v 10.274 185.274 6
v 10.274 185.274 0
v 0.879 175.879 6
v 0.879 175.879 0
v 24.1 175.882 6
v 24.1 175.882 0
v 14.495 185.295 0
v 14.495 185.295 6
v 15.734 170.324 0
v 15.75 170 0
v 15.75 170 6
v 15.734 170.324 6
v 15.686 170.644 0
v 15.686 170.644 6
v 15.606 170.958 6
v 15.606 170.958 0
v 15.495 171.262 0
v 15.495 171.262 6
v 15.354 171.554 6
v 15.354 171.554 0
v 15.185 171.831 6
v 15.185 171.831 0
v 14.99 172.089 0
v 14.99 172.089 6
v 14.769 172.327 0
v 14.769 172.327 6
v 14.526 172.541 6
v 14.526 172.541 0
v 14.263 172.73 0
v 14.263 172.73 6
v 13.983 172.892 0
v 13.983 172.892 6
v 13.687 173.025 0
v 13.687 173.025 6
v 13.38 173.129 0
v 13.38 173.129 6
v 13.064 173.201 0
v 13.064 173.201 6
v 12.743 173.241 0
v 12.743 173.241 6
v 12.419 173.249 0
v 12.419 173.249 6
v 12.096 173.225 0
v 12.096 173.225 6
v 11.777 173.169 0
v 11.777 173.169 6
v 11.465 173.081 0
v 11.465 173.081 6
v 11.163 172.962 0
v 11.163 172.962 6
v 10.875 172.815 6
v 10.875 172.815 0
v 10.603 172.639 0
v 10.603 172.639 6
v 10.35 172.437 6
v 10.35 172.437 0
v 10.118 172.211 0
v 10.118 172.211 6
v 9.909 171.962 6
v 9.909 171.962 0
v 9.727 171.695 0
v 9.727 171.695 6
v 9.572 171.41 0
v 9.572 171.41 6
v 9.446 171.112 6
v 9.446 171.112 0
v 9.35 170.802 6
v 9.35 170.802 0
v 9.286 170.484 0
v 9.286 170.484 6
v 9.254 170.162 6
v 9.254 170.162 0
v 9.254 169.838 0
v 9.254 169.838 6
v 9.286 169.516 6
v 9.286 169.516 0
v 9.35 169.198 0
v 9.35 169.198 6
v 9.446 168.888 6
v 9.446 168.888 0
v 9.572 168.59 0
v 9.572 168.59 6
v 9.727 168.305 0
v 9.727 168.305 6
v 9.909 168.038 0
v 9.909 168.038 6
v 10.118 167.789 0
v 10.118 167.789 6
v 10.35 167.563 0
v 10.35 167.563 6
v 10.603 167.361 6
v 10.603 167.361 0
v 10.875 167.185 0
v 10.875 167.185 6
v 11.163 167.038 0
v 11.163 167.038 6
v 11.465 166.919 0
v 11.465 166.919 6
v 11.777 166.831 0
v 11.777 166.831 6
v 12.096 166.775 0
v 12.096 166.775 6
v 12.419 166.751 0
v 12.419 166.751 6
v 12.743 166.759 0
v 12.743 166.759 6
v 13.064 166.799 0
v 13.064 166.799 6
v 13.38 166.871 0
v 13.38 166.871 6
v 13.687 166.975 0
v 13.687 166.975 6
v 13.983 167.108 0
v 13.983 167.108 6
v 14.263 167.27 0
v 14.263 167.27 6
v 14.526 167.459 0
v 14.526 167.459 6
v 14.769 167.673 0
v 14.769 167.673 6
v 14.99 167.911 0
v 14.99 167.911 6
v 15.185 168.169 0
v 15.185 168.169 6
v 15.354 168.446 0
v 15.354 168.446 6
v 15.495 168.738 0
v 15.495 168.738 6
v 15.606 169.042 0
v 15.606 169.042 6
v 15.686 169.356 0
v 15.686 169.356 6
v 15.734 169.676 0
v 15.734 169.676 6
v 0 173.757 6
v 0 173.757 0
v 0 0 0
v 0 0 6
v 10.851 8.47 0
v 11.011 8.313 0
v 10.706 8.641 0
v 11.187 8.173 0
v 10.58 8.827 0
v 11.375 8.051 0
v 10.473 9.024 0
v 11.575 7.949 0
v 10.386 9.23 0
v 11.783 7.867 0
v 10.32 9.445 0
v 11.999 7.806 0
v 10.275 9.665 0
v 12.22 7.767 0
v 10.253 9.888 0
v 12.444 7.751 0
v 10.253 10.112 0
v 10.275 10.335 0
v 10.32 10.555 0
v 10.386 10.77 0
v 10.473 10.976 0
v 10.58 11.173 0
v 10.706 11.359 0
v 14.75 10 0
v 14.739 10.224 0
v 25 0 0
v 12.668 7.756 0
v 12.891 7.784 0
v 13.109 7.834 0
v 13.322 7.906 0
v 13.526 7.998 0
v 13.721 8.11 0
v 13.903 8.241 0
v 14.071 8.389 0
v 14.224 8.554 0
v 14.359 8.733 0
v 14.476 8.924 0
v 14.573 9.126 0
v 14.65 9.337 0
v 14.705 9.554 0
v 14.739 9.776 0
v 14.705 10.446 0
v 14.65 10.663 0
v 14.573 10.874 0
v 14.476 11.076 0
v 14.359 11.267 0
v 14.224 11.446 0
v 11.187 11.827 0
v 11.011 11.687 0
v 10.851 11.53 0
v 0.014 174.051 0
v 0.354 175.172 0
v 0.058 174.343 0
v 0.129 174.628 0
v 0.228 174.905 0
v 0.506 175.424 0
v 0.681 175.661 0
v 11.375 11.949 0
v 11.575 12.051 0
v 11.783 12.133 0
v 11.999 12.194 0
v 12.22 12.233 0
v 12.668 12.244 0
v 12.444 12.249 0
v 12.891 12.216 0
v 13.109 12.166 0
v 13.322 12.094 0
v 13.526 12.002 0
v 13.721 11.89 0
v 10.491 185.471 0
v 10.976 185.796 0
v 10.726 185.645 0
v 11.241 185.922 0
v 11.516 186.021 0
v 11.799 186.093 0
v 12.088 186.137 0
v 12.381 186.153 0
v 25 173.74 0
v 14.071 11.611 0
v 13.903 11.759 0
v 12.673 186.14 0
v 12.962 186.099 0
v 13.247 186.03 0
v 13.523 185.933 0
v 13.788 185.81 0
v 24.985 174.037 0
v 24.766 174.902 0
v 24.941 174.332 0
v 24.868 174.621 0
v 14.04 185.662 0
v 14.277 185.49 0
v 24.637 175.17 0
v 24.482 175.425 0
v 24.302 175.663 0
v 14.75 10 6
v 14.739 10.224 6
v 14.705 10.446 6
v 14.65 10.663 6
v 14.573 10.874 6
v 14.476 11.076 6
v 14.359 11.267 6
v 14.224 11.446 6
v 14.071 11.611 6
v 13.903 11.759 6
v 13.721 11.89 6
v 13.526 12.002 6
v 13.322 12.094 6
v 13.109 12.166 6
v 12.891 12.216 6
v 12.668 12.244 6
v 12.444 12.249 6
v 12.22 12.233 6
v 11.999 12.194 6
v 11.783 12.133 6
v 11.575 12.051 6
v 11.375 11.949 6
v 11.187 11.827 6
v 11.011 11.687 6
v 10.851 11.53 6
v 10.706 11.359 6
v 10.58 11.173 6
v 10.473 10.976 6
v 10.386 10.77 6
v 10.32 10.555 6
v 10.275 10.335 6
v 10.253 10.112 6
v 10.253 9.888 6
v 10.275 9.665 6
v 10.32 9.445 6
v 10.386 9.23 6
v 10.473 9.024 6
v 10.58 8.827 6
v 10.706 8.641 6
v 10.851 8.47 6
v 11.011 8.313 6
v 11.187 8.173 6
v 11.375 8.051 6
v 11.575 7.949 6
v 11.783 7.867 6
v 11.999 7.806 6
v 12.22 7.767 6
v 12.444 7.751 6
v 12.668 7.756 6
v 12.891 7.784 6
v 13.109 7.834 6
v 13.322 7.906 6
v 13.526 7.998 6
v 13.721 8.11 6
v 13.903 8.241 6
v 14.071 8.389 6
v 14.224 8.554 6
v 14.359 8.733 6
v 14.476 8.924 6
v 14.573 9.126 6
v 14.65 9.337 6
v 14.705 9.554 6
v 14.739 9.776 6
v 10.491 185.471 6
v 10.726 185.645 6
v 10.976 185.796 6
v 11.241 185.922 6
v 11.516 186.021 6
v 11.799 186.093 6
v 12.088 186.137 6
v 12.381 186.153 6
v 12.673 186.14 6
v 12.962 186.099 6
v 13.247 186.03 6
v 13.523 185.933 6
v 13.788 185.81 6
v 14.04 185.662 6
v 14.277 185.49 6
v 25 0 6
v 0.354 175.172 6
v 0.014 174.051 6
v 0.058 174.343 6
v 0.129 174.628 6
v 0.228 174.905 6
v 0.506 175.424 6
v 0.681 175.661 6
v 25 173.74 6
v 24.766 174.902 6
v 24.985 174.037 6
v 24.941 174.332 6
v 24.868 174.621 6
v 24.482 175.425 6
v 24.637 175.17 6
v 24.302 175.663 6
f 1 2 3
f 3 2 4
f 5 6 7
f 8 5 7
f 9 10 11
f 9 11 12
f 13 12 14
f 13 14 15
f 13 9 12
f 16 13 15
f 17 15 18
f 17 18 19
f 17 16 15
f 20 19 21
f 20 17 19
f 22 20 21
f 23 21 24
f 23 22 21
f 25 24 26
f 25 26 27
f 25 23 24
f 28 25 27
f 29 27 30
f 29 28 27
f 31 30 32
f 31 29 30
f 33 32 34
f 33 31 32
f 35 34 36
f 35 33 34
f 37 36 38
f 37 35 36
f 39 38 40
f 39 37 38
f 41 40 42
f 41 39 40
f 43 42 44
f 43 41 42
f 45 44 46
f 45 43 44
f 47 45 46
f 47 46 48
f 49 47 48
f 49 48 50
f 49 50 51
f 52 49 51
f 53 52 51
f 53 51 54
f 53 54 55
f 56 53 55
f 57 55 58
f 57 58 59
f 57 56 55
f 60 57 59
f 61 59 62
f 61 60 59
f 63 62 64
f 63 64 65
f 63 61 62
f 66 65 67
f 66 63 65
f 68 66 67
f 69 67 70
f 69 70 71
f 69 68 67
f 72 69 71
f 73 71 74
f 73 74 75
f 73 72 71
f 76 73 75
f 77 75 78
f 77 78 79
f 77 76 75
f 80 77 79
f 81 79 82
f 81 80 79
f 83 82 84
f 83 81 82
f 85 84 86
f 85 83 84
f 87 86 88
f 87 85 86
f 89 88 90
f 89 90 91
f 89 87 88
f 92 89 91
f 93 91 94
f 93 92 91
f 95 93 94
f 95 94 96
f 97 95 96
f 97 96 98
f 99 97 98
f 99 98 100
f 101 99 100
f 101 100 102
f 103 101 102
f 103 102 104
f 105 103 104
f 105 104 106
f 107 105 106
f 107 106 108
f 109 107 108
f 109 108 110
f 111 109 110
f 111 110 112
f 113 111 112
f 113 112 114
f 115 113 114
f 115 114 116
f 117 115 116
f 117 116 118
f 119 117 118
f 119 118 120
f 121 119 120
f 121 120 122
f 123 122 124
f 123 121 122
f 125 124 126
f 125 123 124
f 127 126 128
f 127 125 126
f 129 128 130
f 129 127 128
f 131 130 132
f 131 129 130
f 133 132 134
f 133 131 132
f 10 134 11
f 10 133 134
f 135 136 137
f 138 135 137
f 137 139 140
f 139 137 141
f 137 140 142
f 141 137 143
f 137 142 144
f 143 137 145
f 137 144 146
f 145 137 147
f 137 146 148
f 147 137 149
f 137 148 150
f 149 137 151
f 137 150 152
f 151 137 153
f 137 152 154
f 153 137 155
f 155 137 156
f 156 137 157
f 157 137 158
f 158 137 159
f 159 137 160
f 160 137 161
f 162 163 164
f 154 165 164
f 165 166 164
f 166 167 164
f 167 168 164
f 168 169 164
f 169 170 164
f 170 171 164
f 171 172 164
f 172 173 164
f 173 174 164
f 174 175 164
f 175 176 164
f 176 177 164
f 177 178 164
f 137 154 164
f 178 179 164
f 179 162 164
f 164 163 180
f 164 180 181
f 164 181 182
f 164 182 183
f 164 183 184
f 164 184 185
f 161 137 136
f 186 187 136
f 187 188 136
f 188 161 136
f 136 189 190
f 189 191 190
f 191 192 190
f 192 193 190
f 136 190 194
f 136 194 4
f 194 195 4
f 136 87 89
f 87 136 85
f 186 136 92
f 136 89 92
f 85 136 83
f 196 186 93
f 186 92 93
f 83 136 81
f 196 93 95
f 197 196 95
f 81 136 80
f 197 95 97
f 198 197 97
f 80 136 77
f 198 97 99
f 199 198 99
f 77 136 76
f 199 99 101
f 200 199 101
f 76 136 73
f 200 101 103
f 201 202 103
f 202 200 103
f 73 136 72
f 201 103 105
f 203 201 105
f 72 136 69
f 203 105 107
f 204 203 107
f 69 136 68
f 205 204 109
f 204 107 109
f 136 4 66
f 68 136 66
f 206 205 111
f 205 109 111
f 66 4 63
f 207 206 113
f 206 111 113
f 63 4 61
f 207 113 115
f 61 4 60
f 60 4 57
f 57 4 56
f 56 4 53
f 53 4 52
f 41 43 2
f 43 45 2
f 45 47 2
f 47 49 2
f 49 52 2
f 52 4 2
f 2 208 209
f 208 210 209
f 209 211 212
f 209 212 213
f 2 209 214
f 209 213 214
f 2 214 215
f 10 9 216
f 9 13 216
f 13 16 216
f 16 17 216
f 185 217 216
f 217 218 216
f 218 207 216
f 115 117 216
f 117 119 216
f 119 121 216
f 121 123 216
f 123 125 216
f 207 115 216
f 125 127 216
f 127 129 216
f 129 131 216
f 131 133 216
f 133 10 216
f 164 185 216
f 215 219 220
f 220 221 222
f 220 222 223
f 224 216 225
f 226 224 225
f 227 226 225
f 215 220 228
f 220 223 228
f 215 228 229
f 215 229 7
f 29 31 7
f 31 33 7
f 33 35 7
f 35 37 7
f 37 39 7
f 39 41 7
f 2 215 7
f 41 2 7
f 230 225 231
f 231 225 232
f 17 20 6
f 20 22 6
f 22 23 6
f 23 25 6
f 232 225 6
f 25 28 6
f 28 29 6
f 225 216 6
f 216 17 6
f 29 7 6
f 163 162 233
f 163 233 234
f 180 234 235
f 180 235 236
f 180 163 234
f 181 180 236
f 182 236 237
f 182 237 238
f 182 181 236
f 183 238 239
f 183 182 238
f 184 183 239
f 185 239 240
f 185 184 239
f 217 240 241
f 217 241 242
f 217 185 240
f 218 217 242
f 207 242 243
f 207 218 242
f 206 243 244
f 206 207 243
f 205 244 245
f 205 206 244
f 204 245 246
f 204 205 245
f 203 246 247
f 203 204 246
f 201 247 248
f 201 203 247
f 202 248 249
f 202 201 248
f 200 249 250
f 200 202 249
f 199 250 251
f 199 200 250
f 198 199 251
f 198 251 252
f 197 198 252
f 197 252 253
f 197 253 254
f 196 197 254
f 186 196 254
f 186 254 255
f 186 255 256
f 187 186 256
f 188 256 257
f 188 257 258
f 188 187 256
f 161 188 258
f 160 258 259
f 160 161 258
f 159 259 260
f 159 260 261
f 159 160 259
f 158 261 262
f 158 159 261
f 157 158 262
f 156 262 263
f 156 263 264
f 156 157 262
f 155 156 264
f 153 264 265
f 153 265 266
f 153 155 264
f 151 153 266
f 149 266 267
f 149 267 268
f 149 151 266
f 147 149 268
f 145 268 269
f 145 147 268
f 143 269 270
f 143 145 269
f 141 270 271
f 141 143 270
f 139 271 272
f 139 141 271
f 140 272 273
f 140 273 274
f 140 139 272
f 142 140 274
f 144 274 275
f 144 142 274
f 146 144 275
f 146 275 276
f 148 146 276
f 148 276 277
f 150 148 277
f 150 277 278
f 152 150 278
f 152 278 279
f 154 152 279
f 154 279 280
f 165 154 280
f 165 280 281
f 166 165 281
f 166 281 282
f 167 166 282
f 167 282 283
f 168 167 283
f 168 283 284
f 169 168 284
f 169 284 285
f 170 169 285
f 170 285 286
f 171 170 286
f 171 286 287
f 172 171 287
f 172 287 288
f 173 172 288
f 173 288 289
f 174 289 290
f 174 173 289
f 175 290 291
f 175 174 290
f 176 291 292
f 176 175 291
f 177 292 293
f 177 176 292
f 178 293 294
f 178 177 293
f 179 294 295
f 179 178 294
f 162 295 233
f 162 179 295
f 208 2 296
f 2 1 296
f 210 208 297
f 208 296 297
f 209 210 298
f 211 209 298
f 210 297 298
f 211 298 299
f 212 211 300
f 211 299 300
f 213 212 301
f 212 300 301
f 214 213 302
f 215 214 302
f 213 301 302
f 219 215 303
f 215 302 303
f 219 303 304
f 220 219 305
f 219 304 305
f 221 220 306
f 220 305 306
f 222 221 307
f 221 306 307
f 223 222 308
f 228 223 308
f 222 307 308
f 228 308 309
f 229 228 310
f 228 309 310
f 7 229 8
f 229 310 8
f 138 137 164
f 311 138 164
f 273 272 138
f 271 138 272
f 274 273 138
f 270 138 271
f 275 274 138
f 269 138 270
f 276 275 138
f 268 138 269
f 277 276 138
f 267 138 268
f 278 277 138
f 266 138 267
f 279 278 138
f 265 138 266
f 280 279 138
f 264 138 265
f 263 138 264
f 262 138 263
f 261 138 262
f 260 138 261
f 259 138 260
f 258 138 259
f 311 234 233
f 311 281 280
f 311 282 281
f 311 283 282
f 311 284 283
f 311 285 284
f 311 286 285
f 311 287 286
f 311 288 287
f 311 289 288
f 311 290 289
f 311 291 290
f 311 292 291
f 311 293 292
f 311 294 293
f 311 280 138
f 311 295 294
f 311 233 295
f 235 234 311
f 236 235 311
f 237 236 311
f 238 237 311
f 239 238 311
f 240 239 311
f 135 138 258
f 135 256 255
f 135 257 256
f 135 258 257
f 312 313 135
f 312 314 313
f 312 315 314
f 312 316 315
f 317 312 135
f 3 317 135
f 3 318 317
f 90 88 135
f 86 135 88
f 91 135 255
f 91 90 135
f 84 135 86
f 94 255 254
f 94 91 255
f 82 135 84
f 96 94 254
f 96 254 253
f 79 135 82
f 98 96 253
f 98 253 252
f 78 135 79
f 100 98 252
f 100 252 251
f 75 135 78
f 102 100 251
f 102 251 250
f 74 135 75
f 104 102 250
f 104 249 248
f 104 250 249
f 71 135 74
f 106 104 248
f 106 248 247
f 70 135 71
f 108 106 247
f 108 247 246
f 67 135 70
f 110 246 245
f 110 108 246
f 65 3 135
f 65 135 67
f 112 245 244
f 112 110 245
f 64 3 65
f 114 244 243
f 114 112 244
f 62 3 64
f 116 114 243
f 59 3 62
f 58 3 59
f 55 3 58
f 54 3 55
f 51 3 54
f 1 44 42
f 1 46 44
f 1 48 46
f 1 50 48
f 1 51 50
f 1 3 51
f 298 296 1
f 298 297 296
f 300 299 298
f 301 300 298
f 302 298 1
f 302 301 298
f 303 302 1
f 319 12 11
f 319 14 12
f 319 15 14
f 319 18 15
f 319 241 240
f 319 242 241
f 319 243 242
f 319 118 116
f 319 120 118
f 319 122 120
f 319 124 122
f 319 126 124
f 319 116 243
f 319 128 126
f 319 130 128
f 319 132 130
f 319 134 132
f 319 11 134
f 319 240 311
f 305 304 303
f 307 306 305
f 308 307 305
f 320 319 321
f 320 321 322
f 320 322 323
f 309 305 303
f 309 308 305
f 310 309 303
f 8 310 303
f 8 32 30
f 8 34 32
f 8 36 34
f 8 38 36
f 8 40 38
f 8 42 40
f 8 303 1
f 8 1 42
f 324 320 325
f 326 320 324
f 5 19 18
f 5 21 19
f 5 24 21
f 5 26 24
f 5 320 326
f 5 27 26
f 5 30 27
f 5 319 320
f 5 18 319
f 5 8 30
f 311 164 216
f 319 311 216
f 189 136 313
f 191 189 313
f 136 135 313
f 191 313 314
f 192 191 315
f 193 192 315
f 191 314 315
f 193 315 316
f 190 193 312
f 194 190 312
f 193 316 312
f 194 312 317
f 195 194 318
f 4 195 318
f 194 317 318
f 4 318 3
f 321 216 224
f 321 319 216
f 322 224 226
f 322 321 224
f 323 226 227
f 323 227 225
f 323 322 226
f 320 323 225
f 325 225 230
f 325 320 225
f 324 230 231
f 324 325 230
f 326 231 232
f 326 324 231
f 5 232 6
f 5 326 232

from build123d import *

# Parameters (mm, degrees)
SKETCH_R   = 2.25
SKETCH_R_2 = 3.25
PAD_DEPTH  = 6
FILLET_R   = 3


with BuildPart() as part:
    # Sketch → Pad (new body)
    with BuildSketch(Plane.XY):
        Polygon((0, 0), (25, 0), (25, 175), (12.374371, 187.374367), (0, 175), align=None)
        with Locations((12.5, 10)):
            Circle(SKETCH_R, mode=Mode.SUBTRACT)
        with Locations((12.5, 170)):
            Circle(SKETCH_R_2, mode=Mode.SUBTRACT)
    extrude(amount=PAD_DEPTH)

    # Fillet
    fillet_edges = [part.edges().sort_by_distance(p)[0] for p in [
        (12.374371, 187.374367, 3),
        (25, 175, 3),
        (0, 175, 3),
    ]]
    fillet(fillet_edges, radius=FILLET_R)


solid = part.part
